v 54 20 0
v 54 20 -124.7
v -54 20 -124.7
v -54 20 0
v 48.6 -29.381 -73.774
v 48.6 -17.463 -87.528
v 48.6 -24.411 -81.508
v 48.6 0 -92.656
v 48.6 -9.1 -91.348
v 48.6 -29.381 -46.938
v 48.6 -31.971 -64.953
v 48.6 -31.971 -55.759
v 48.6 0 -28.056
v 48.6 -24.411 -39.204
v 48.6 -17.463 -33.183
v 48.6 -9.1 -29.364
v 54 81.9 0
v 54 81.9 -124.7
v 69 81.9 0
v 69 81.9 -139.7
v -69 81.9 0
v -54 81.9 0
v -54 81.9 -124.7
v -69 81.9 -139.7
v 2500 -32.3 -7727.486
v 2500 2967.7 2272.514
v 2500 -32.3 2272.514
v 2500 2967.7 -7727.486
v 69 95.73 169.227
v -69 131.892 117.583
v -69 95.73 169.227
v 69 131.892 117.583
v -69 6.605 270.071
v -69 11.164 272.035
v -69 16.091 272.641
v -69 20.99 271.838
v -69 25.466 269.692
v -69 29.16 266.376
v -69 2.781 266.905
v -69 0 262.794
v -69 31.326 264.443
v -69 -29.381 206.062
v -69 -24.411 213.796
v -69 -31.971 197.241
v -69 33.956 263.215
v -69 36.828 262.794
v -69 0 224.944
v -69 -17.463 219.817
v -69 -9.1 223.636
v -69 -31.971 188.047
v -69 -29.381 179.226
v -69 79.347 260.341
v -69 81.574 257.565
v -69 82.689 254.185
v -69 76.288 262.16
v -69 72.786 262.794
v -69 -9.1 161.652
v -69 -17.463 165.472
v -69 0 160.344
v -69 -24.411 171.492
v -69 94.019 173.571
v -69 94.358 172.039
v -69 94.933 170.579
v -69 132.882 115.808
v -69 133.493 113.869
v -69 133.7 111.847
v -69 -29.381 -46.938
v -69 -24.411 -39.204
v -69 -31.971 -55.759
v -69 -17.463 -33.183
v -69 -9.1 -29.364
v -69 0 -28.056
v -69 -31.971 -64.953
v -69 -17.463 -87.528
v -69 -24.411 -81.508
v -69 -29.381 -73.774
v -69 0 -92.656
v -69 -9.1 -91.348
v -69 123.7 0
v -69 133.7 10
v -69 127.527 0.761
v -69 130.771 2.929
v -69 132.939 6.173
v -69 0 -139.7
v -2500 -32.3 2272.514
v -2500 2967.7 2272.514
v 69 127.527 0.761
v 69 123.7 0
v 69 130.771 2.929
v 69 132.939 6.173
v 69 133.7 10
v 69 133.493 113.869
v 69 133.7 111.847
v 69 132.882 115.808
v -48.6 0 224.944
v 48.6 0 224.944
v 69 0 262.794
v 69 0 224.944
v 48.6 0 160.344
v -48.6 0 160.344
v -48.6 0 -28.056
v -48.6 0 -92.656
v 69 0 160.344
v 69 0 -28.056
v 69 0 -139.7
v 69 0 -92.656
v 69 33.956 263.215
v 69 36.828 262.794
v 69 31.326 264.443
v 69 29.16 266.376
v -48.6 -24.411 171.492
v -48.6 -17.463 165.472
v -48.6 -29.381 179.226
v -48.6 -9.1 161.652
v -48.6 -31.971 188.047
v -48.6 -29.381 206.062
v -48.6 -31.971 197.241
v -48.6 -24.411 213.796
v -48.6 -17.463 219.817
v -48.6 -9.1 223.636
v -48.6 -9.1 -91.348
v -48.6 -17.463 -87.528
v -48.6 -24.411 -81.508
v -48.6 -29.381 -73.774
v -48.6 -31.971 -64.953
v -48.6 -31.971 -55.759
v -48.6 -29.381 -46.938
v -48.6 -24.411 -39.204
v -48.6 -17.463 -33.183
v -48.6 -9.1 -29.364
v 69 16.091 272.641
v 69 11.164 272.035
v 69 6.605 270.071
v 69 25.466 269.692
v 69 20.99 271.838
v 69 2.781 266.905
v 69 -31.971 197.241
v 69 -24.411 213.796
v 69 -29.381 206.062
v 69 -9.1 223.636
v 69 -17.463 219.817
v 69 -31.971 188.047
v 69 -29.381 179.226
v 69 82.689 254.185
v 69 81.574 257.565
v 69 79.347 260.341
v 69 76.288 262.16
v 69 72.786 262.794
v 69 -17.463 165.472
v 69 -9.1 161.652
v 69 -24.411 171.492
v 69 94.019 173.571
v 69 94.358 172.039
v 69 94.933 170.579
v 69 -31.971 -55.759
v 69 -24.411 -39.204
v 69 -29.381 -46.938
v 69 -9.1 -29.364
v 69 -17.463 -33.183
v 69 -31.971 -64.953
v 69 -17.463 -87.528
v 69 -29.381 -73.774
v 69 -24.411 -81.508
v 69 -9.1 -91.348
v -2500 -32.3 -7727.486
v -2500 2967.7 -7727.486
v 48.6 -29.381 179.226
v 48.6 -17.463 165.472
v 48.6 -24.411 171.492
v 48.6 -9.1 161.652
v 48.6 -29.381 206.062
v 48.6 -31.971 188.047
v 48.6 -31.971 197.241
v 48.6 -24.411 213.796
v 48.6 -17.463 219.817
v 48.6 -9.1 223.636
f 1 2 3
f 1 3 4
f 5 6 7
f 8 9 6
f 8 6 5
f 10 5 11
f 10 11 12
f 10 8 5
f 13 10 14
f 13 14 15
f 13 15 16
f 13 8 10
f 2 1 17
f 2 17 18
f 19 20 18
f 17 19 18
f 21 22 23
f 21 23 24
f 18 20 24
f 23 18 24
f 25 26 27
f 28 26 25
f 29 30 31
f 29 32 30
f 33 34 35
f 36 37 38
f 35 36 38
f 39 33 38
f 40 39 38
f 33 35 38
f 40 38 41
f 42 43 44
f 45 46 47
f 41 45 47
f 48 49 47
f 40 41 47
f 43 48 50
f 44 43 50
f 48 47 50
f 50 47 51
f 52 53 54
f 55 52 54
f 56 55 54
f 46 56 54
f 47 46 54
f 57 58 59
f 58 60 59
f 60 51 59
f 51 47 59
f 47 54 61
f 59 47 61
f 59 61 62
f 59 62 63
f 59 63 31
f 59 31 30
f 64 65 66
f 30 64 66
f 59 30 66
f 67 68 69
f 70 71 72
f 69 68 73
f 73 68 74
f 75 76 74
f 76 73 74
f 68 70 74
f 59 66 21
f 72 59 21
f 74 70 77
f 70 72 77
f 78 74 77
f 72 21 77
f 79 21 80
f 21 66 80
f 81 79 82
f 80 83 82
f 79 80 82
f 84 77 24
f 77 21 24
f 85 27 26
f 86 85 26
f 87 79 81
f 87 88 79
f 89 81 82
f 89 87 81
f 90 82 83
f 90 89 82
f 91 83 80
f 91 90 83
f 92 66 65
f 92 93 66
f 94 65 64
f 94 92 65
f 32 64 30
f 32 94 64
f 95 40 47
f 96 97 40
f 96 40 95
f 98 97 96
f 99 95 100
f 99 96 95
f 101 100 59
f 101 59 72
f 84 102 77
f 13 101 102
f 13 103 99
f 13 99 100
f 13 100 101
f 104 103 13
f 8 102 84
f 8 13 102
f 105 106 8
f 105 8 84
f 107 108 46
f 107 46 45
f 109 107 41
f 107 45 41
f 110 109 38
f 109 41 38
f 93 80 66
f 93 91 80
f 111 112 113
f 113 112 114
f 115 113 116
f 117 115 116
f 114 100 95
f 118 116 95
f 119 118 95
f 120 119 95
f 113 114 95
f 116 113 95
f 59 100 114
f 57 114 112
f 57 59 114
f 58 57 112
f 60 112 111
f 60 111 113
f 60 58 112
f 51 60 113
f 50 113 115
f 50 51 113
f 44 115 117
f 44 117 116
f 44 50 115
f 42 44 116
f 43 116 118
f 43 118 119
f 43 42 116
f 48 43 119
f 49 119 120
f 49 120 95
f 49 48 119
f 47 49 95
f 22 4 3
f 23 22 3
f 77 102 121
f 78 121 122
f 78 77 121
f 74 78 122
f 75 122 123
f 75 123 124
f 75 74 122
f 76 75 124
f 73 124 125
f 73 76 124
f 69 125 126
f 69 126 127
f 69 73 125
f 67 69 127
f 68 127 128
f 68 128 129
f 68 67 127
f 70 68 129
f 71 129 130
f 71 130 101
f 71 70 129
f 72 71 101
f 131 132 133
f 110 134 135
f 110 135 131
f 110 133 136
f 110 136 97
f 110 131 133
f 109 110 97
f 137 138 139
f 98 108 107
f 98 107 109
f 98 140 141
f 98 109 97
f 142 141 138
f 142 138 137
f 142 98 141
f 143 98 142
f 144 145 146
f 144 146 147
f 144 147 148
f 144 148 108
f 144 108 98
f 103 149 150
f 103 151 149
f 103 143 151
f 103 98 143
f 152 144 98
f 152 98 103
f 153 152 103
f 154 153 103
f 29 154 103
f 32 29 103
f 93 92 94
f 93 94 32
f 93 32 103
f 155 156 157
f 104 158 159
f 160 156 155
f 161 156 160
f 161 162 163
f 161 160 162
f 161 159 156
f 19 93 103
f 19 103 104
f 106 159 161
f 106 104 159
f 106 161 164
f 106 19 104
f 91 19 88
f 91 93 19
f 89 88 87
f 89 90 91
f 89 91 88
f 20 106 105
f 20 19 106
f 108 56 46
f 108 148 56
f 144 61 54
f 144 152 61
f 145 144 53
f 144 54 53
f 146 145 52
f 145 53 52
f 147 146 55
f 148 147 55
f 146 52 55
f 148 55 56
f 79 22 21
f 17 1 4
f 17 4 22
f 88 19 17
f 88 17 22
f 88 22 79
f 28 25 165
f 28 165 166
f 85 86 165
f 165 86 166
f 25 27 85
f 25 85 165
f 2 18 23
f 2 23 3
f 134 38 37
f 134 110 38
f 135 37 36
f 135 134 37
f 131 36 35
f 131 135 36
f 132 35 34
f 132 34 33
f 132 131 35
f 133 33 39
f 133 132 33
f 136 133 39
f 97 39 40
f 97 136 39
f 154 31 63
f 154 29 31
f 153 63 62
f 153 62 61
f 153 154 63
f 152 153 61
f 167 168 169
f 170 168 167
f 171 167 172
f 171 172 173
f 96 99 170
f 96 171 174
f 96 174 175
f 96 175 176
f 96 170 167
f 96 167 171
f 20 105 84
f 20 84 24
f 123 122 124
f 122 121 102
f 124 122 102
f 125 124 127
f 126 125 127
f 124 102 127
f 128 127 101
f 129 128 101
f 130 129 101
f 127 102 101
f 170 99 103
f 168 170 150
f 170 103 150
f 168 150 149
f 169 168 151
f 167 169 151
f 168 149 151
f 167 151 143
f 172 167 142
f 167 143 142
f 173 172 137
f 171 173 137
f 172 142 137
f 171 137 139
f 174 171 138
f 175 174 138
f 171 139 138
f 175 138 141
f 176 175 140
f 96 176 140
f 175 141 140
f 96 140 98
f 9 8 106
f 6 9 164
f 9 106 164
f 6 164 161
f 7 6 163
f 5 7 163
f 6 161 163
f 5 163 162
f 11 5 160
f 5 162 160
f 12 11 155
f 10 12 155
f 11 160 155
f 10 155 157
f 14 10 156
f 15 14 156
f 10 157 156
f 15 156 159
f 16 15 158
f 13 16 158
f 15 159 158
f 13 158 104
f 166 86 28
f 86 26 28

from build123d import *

# Parameters (mm, degrees)
BOSS_EXTRUDE1_DEPTH = 69
SKETCH4_W           = 15
SKETCH4_H           = 124.7
BOSS_EXTRUDE2_DEPTH = 61.9
BOSS_EXTRUDE3_DEPTH = 20.4
FILLET1_R           = 10
SKETCH6_W           = 10000
SKETCH6_H           = 3000
BOSS_EXTRUDE4_DEPTH = 2500


with BuildPart() as part:
    # Sketch2 → Boss-Extrude1 (new body, symmetric)
    with BuildSketch(Plane(origin=(0, 0, 0), x_dir=(0, 0, -1), z_dir=(1, 0, 0))):
        with BuildLine():
            Line((-262.793626597, 0), (0, 0))
            Line((0, 0), (139.7, 0))
            Line((139.7, 0), (139.7, 81.9))
            Line((139.7, 81.9), (124.7, 81.9))
            Line((124.7, 81.9), (124.7, 20))
            Line((124.7, 20), (0, 20))
            Line((0, 20), (0, 133.7))
            Line((0, 133.7), (-115, 133.7))
            Line((-115, 133.7), (-171.193830238, 94.352656466))
            Line((-171.193830238, 94.352656466), (-262.793626597, 81.479144628))
            Line((-262.793626597, 81.479144628), (-262.793626597, 31.479144628))
            ThreePointArc((-262.793626597, 31.479144628), (-272.644060375, 15.739572314), (-262.793626597, 0))
        make_face()
    extrude(amount=BOSS_EXTRUDE1_DEPTH, both=True)

    # Sketch4 → Boss-Extrude2 (add)
    with BuildSketch(Plane(origin=(0, 20, 0), x_dir=(1, 0, 0), z_dir=(0, 1, 0))):
        with Locations((61.5, 62.35)):
            Rectangle(SKETCH4_W, SKETCH4_H)
    boss_extrude2 = extrude(amount=BOSS_EXTRUDE2_DEPTH)

    # Mirror1: Boss-Extrude2 across plane
    add(boss_extrude2.mirror(Plane(origin=(0, 0, 0), x_dir=(0, 0, 1), z_dir=(1, 0, 0))))

    # Sketch5 → Boss-Extrude3 (add)
    with BuildSketch(Plane(origin=(69, 0, 0), x_dir=(0, 0, -1), z_dir=(1, 0, 0))):
        with BuildLine():
            Line((-224.944060375, 0), (-160.344060375, 0))
            ThreePointArc((-160.344060375, 0), (-192.644060375, -32.3), (-224.944060375, 0))
        make_face()
        with BuildLine():
            Line((28.055939625, 0), (92.655939625, 0))
            ThreePointArc((92.655939625, 0), (60.355939625, -32.3), (28.055939625, 0))
        make_face()
    boss_extrude3 = extrude(amount=-BOSS_EXTRUDE3_DEPTH)

    # Mirror2: Boss-Extrude3 across plane
    add(boss_extrude3.mirror(Plane(origin=(0, 0, 0), x_dir=(0, 0, 1), z_dir=(1, 0, 0))))

    # Fillet1
    fillet1_edges = [part.edges().sort_by_distance(p)[0] for p in [
        (0, 31.479144628, 262.793626597),
        (0, 81.479144628, 262.793626597),
        (0, 94.352656466, 171.193830238),
        (0, 133.7, 115),
        (0, 133.7, 0),
    ]]
    fillet(fillet1_edges, radius=FILLET1_R)


with BuildPart() as body_2:
    # Sketch6 → Boss-Extrude4 (new body, symmetric)
    with BuildSketch(Plane(origin=(0, 0, 0), x_dir=(0, 0, -1), z_dir=(1, 0, 0))):
        with Locations((2727.48649749, 1467.7)):
            Rectangle(SKETCH6_W, SKETCH6_H)
    extrude(amount=BOSS_EXTRUDE4_DEPTH, both=True)


solid = Compound([part.part, body_2.part])
